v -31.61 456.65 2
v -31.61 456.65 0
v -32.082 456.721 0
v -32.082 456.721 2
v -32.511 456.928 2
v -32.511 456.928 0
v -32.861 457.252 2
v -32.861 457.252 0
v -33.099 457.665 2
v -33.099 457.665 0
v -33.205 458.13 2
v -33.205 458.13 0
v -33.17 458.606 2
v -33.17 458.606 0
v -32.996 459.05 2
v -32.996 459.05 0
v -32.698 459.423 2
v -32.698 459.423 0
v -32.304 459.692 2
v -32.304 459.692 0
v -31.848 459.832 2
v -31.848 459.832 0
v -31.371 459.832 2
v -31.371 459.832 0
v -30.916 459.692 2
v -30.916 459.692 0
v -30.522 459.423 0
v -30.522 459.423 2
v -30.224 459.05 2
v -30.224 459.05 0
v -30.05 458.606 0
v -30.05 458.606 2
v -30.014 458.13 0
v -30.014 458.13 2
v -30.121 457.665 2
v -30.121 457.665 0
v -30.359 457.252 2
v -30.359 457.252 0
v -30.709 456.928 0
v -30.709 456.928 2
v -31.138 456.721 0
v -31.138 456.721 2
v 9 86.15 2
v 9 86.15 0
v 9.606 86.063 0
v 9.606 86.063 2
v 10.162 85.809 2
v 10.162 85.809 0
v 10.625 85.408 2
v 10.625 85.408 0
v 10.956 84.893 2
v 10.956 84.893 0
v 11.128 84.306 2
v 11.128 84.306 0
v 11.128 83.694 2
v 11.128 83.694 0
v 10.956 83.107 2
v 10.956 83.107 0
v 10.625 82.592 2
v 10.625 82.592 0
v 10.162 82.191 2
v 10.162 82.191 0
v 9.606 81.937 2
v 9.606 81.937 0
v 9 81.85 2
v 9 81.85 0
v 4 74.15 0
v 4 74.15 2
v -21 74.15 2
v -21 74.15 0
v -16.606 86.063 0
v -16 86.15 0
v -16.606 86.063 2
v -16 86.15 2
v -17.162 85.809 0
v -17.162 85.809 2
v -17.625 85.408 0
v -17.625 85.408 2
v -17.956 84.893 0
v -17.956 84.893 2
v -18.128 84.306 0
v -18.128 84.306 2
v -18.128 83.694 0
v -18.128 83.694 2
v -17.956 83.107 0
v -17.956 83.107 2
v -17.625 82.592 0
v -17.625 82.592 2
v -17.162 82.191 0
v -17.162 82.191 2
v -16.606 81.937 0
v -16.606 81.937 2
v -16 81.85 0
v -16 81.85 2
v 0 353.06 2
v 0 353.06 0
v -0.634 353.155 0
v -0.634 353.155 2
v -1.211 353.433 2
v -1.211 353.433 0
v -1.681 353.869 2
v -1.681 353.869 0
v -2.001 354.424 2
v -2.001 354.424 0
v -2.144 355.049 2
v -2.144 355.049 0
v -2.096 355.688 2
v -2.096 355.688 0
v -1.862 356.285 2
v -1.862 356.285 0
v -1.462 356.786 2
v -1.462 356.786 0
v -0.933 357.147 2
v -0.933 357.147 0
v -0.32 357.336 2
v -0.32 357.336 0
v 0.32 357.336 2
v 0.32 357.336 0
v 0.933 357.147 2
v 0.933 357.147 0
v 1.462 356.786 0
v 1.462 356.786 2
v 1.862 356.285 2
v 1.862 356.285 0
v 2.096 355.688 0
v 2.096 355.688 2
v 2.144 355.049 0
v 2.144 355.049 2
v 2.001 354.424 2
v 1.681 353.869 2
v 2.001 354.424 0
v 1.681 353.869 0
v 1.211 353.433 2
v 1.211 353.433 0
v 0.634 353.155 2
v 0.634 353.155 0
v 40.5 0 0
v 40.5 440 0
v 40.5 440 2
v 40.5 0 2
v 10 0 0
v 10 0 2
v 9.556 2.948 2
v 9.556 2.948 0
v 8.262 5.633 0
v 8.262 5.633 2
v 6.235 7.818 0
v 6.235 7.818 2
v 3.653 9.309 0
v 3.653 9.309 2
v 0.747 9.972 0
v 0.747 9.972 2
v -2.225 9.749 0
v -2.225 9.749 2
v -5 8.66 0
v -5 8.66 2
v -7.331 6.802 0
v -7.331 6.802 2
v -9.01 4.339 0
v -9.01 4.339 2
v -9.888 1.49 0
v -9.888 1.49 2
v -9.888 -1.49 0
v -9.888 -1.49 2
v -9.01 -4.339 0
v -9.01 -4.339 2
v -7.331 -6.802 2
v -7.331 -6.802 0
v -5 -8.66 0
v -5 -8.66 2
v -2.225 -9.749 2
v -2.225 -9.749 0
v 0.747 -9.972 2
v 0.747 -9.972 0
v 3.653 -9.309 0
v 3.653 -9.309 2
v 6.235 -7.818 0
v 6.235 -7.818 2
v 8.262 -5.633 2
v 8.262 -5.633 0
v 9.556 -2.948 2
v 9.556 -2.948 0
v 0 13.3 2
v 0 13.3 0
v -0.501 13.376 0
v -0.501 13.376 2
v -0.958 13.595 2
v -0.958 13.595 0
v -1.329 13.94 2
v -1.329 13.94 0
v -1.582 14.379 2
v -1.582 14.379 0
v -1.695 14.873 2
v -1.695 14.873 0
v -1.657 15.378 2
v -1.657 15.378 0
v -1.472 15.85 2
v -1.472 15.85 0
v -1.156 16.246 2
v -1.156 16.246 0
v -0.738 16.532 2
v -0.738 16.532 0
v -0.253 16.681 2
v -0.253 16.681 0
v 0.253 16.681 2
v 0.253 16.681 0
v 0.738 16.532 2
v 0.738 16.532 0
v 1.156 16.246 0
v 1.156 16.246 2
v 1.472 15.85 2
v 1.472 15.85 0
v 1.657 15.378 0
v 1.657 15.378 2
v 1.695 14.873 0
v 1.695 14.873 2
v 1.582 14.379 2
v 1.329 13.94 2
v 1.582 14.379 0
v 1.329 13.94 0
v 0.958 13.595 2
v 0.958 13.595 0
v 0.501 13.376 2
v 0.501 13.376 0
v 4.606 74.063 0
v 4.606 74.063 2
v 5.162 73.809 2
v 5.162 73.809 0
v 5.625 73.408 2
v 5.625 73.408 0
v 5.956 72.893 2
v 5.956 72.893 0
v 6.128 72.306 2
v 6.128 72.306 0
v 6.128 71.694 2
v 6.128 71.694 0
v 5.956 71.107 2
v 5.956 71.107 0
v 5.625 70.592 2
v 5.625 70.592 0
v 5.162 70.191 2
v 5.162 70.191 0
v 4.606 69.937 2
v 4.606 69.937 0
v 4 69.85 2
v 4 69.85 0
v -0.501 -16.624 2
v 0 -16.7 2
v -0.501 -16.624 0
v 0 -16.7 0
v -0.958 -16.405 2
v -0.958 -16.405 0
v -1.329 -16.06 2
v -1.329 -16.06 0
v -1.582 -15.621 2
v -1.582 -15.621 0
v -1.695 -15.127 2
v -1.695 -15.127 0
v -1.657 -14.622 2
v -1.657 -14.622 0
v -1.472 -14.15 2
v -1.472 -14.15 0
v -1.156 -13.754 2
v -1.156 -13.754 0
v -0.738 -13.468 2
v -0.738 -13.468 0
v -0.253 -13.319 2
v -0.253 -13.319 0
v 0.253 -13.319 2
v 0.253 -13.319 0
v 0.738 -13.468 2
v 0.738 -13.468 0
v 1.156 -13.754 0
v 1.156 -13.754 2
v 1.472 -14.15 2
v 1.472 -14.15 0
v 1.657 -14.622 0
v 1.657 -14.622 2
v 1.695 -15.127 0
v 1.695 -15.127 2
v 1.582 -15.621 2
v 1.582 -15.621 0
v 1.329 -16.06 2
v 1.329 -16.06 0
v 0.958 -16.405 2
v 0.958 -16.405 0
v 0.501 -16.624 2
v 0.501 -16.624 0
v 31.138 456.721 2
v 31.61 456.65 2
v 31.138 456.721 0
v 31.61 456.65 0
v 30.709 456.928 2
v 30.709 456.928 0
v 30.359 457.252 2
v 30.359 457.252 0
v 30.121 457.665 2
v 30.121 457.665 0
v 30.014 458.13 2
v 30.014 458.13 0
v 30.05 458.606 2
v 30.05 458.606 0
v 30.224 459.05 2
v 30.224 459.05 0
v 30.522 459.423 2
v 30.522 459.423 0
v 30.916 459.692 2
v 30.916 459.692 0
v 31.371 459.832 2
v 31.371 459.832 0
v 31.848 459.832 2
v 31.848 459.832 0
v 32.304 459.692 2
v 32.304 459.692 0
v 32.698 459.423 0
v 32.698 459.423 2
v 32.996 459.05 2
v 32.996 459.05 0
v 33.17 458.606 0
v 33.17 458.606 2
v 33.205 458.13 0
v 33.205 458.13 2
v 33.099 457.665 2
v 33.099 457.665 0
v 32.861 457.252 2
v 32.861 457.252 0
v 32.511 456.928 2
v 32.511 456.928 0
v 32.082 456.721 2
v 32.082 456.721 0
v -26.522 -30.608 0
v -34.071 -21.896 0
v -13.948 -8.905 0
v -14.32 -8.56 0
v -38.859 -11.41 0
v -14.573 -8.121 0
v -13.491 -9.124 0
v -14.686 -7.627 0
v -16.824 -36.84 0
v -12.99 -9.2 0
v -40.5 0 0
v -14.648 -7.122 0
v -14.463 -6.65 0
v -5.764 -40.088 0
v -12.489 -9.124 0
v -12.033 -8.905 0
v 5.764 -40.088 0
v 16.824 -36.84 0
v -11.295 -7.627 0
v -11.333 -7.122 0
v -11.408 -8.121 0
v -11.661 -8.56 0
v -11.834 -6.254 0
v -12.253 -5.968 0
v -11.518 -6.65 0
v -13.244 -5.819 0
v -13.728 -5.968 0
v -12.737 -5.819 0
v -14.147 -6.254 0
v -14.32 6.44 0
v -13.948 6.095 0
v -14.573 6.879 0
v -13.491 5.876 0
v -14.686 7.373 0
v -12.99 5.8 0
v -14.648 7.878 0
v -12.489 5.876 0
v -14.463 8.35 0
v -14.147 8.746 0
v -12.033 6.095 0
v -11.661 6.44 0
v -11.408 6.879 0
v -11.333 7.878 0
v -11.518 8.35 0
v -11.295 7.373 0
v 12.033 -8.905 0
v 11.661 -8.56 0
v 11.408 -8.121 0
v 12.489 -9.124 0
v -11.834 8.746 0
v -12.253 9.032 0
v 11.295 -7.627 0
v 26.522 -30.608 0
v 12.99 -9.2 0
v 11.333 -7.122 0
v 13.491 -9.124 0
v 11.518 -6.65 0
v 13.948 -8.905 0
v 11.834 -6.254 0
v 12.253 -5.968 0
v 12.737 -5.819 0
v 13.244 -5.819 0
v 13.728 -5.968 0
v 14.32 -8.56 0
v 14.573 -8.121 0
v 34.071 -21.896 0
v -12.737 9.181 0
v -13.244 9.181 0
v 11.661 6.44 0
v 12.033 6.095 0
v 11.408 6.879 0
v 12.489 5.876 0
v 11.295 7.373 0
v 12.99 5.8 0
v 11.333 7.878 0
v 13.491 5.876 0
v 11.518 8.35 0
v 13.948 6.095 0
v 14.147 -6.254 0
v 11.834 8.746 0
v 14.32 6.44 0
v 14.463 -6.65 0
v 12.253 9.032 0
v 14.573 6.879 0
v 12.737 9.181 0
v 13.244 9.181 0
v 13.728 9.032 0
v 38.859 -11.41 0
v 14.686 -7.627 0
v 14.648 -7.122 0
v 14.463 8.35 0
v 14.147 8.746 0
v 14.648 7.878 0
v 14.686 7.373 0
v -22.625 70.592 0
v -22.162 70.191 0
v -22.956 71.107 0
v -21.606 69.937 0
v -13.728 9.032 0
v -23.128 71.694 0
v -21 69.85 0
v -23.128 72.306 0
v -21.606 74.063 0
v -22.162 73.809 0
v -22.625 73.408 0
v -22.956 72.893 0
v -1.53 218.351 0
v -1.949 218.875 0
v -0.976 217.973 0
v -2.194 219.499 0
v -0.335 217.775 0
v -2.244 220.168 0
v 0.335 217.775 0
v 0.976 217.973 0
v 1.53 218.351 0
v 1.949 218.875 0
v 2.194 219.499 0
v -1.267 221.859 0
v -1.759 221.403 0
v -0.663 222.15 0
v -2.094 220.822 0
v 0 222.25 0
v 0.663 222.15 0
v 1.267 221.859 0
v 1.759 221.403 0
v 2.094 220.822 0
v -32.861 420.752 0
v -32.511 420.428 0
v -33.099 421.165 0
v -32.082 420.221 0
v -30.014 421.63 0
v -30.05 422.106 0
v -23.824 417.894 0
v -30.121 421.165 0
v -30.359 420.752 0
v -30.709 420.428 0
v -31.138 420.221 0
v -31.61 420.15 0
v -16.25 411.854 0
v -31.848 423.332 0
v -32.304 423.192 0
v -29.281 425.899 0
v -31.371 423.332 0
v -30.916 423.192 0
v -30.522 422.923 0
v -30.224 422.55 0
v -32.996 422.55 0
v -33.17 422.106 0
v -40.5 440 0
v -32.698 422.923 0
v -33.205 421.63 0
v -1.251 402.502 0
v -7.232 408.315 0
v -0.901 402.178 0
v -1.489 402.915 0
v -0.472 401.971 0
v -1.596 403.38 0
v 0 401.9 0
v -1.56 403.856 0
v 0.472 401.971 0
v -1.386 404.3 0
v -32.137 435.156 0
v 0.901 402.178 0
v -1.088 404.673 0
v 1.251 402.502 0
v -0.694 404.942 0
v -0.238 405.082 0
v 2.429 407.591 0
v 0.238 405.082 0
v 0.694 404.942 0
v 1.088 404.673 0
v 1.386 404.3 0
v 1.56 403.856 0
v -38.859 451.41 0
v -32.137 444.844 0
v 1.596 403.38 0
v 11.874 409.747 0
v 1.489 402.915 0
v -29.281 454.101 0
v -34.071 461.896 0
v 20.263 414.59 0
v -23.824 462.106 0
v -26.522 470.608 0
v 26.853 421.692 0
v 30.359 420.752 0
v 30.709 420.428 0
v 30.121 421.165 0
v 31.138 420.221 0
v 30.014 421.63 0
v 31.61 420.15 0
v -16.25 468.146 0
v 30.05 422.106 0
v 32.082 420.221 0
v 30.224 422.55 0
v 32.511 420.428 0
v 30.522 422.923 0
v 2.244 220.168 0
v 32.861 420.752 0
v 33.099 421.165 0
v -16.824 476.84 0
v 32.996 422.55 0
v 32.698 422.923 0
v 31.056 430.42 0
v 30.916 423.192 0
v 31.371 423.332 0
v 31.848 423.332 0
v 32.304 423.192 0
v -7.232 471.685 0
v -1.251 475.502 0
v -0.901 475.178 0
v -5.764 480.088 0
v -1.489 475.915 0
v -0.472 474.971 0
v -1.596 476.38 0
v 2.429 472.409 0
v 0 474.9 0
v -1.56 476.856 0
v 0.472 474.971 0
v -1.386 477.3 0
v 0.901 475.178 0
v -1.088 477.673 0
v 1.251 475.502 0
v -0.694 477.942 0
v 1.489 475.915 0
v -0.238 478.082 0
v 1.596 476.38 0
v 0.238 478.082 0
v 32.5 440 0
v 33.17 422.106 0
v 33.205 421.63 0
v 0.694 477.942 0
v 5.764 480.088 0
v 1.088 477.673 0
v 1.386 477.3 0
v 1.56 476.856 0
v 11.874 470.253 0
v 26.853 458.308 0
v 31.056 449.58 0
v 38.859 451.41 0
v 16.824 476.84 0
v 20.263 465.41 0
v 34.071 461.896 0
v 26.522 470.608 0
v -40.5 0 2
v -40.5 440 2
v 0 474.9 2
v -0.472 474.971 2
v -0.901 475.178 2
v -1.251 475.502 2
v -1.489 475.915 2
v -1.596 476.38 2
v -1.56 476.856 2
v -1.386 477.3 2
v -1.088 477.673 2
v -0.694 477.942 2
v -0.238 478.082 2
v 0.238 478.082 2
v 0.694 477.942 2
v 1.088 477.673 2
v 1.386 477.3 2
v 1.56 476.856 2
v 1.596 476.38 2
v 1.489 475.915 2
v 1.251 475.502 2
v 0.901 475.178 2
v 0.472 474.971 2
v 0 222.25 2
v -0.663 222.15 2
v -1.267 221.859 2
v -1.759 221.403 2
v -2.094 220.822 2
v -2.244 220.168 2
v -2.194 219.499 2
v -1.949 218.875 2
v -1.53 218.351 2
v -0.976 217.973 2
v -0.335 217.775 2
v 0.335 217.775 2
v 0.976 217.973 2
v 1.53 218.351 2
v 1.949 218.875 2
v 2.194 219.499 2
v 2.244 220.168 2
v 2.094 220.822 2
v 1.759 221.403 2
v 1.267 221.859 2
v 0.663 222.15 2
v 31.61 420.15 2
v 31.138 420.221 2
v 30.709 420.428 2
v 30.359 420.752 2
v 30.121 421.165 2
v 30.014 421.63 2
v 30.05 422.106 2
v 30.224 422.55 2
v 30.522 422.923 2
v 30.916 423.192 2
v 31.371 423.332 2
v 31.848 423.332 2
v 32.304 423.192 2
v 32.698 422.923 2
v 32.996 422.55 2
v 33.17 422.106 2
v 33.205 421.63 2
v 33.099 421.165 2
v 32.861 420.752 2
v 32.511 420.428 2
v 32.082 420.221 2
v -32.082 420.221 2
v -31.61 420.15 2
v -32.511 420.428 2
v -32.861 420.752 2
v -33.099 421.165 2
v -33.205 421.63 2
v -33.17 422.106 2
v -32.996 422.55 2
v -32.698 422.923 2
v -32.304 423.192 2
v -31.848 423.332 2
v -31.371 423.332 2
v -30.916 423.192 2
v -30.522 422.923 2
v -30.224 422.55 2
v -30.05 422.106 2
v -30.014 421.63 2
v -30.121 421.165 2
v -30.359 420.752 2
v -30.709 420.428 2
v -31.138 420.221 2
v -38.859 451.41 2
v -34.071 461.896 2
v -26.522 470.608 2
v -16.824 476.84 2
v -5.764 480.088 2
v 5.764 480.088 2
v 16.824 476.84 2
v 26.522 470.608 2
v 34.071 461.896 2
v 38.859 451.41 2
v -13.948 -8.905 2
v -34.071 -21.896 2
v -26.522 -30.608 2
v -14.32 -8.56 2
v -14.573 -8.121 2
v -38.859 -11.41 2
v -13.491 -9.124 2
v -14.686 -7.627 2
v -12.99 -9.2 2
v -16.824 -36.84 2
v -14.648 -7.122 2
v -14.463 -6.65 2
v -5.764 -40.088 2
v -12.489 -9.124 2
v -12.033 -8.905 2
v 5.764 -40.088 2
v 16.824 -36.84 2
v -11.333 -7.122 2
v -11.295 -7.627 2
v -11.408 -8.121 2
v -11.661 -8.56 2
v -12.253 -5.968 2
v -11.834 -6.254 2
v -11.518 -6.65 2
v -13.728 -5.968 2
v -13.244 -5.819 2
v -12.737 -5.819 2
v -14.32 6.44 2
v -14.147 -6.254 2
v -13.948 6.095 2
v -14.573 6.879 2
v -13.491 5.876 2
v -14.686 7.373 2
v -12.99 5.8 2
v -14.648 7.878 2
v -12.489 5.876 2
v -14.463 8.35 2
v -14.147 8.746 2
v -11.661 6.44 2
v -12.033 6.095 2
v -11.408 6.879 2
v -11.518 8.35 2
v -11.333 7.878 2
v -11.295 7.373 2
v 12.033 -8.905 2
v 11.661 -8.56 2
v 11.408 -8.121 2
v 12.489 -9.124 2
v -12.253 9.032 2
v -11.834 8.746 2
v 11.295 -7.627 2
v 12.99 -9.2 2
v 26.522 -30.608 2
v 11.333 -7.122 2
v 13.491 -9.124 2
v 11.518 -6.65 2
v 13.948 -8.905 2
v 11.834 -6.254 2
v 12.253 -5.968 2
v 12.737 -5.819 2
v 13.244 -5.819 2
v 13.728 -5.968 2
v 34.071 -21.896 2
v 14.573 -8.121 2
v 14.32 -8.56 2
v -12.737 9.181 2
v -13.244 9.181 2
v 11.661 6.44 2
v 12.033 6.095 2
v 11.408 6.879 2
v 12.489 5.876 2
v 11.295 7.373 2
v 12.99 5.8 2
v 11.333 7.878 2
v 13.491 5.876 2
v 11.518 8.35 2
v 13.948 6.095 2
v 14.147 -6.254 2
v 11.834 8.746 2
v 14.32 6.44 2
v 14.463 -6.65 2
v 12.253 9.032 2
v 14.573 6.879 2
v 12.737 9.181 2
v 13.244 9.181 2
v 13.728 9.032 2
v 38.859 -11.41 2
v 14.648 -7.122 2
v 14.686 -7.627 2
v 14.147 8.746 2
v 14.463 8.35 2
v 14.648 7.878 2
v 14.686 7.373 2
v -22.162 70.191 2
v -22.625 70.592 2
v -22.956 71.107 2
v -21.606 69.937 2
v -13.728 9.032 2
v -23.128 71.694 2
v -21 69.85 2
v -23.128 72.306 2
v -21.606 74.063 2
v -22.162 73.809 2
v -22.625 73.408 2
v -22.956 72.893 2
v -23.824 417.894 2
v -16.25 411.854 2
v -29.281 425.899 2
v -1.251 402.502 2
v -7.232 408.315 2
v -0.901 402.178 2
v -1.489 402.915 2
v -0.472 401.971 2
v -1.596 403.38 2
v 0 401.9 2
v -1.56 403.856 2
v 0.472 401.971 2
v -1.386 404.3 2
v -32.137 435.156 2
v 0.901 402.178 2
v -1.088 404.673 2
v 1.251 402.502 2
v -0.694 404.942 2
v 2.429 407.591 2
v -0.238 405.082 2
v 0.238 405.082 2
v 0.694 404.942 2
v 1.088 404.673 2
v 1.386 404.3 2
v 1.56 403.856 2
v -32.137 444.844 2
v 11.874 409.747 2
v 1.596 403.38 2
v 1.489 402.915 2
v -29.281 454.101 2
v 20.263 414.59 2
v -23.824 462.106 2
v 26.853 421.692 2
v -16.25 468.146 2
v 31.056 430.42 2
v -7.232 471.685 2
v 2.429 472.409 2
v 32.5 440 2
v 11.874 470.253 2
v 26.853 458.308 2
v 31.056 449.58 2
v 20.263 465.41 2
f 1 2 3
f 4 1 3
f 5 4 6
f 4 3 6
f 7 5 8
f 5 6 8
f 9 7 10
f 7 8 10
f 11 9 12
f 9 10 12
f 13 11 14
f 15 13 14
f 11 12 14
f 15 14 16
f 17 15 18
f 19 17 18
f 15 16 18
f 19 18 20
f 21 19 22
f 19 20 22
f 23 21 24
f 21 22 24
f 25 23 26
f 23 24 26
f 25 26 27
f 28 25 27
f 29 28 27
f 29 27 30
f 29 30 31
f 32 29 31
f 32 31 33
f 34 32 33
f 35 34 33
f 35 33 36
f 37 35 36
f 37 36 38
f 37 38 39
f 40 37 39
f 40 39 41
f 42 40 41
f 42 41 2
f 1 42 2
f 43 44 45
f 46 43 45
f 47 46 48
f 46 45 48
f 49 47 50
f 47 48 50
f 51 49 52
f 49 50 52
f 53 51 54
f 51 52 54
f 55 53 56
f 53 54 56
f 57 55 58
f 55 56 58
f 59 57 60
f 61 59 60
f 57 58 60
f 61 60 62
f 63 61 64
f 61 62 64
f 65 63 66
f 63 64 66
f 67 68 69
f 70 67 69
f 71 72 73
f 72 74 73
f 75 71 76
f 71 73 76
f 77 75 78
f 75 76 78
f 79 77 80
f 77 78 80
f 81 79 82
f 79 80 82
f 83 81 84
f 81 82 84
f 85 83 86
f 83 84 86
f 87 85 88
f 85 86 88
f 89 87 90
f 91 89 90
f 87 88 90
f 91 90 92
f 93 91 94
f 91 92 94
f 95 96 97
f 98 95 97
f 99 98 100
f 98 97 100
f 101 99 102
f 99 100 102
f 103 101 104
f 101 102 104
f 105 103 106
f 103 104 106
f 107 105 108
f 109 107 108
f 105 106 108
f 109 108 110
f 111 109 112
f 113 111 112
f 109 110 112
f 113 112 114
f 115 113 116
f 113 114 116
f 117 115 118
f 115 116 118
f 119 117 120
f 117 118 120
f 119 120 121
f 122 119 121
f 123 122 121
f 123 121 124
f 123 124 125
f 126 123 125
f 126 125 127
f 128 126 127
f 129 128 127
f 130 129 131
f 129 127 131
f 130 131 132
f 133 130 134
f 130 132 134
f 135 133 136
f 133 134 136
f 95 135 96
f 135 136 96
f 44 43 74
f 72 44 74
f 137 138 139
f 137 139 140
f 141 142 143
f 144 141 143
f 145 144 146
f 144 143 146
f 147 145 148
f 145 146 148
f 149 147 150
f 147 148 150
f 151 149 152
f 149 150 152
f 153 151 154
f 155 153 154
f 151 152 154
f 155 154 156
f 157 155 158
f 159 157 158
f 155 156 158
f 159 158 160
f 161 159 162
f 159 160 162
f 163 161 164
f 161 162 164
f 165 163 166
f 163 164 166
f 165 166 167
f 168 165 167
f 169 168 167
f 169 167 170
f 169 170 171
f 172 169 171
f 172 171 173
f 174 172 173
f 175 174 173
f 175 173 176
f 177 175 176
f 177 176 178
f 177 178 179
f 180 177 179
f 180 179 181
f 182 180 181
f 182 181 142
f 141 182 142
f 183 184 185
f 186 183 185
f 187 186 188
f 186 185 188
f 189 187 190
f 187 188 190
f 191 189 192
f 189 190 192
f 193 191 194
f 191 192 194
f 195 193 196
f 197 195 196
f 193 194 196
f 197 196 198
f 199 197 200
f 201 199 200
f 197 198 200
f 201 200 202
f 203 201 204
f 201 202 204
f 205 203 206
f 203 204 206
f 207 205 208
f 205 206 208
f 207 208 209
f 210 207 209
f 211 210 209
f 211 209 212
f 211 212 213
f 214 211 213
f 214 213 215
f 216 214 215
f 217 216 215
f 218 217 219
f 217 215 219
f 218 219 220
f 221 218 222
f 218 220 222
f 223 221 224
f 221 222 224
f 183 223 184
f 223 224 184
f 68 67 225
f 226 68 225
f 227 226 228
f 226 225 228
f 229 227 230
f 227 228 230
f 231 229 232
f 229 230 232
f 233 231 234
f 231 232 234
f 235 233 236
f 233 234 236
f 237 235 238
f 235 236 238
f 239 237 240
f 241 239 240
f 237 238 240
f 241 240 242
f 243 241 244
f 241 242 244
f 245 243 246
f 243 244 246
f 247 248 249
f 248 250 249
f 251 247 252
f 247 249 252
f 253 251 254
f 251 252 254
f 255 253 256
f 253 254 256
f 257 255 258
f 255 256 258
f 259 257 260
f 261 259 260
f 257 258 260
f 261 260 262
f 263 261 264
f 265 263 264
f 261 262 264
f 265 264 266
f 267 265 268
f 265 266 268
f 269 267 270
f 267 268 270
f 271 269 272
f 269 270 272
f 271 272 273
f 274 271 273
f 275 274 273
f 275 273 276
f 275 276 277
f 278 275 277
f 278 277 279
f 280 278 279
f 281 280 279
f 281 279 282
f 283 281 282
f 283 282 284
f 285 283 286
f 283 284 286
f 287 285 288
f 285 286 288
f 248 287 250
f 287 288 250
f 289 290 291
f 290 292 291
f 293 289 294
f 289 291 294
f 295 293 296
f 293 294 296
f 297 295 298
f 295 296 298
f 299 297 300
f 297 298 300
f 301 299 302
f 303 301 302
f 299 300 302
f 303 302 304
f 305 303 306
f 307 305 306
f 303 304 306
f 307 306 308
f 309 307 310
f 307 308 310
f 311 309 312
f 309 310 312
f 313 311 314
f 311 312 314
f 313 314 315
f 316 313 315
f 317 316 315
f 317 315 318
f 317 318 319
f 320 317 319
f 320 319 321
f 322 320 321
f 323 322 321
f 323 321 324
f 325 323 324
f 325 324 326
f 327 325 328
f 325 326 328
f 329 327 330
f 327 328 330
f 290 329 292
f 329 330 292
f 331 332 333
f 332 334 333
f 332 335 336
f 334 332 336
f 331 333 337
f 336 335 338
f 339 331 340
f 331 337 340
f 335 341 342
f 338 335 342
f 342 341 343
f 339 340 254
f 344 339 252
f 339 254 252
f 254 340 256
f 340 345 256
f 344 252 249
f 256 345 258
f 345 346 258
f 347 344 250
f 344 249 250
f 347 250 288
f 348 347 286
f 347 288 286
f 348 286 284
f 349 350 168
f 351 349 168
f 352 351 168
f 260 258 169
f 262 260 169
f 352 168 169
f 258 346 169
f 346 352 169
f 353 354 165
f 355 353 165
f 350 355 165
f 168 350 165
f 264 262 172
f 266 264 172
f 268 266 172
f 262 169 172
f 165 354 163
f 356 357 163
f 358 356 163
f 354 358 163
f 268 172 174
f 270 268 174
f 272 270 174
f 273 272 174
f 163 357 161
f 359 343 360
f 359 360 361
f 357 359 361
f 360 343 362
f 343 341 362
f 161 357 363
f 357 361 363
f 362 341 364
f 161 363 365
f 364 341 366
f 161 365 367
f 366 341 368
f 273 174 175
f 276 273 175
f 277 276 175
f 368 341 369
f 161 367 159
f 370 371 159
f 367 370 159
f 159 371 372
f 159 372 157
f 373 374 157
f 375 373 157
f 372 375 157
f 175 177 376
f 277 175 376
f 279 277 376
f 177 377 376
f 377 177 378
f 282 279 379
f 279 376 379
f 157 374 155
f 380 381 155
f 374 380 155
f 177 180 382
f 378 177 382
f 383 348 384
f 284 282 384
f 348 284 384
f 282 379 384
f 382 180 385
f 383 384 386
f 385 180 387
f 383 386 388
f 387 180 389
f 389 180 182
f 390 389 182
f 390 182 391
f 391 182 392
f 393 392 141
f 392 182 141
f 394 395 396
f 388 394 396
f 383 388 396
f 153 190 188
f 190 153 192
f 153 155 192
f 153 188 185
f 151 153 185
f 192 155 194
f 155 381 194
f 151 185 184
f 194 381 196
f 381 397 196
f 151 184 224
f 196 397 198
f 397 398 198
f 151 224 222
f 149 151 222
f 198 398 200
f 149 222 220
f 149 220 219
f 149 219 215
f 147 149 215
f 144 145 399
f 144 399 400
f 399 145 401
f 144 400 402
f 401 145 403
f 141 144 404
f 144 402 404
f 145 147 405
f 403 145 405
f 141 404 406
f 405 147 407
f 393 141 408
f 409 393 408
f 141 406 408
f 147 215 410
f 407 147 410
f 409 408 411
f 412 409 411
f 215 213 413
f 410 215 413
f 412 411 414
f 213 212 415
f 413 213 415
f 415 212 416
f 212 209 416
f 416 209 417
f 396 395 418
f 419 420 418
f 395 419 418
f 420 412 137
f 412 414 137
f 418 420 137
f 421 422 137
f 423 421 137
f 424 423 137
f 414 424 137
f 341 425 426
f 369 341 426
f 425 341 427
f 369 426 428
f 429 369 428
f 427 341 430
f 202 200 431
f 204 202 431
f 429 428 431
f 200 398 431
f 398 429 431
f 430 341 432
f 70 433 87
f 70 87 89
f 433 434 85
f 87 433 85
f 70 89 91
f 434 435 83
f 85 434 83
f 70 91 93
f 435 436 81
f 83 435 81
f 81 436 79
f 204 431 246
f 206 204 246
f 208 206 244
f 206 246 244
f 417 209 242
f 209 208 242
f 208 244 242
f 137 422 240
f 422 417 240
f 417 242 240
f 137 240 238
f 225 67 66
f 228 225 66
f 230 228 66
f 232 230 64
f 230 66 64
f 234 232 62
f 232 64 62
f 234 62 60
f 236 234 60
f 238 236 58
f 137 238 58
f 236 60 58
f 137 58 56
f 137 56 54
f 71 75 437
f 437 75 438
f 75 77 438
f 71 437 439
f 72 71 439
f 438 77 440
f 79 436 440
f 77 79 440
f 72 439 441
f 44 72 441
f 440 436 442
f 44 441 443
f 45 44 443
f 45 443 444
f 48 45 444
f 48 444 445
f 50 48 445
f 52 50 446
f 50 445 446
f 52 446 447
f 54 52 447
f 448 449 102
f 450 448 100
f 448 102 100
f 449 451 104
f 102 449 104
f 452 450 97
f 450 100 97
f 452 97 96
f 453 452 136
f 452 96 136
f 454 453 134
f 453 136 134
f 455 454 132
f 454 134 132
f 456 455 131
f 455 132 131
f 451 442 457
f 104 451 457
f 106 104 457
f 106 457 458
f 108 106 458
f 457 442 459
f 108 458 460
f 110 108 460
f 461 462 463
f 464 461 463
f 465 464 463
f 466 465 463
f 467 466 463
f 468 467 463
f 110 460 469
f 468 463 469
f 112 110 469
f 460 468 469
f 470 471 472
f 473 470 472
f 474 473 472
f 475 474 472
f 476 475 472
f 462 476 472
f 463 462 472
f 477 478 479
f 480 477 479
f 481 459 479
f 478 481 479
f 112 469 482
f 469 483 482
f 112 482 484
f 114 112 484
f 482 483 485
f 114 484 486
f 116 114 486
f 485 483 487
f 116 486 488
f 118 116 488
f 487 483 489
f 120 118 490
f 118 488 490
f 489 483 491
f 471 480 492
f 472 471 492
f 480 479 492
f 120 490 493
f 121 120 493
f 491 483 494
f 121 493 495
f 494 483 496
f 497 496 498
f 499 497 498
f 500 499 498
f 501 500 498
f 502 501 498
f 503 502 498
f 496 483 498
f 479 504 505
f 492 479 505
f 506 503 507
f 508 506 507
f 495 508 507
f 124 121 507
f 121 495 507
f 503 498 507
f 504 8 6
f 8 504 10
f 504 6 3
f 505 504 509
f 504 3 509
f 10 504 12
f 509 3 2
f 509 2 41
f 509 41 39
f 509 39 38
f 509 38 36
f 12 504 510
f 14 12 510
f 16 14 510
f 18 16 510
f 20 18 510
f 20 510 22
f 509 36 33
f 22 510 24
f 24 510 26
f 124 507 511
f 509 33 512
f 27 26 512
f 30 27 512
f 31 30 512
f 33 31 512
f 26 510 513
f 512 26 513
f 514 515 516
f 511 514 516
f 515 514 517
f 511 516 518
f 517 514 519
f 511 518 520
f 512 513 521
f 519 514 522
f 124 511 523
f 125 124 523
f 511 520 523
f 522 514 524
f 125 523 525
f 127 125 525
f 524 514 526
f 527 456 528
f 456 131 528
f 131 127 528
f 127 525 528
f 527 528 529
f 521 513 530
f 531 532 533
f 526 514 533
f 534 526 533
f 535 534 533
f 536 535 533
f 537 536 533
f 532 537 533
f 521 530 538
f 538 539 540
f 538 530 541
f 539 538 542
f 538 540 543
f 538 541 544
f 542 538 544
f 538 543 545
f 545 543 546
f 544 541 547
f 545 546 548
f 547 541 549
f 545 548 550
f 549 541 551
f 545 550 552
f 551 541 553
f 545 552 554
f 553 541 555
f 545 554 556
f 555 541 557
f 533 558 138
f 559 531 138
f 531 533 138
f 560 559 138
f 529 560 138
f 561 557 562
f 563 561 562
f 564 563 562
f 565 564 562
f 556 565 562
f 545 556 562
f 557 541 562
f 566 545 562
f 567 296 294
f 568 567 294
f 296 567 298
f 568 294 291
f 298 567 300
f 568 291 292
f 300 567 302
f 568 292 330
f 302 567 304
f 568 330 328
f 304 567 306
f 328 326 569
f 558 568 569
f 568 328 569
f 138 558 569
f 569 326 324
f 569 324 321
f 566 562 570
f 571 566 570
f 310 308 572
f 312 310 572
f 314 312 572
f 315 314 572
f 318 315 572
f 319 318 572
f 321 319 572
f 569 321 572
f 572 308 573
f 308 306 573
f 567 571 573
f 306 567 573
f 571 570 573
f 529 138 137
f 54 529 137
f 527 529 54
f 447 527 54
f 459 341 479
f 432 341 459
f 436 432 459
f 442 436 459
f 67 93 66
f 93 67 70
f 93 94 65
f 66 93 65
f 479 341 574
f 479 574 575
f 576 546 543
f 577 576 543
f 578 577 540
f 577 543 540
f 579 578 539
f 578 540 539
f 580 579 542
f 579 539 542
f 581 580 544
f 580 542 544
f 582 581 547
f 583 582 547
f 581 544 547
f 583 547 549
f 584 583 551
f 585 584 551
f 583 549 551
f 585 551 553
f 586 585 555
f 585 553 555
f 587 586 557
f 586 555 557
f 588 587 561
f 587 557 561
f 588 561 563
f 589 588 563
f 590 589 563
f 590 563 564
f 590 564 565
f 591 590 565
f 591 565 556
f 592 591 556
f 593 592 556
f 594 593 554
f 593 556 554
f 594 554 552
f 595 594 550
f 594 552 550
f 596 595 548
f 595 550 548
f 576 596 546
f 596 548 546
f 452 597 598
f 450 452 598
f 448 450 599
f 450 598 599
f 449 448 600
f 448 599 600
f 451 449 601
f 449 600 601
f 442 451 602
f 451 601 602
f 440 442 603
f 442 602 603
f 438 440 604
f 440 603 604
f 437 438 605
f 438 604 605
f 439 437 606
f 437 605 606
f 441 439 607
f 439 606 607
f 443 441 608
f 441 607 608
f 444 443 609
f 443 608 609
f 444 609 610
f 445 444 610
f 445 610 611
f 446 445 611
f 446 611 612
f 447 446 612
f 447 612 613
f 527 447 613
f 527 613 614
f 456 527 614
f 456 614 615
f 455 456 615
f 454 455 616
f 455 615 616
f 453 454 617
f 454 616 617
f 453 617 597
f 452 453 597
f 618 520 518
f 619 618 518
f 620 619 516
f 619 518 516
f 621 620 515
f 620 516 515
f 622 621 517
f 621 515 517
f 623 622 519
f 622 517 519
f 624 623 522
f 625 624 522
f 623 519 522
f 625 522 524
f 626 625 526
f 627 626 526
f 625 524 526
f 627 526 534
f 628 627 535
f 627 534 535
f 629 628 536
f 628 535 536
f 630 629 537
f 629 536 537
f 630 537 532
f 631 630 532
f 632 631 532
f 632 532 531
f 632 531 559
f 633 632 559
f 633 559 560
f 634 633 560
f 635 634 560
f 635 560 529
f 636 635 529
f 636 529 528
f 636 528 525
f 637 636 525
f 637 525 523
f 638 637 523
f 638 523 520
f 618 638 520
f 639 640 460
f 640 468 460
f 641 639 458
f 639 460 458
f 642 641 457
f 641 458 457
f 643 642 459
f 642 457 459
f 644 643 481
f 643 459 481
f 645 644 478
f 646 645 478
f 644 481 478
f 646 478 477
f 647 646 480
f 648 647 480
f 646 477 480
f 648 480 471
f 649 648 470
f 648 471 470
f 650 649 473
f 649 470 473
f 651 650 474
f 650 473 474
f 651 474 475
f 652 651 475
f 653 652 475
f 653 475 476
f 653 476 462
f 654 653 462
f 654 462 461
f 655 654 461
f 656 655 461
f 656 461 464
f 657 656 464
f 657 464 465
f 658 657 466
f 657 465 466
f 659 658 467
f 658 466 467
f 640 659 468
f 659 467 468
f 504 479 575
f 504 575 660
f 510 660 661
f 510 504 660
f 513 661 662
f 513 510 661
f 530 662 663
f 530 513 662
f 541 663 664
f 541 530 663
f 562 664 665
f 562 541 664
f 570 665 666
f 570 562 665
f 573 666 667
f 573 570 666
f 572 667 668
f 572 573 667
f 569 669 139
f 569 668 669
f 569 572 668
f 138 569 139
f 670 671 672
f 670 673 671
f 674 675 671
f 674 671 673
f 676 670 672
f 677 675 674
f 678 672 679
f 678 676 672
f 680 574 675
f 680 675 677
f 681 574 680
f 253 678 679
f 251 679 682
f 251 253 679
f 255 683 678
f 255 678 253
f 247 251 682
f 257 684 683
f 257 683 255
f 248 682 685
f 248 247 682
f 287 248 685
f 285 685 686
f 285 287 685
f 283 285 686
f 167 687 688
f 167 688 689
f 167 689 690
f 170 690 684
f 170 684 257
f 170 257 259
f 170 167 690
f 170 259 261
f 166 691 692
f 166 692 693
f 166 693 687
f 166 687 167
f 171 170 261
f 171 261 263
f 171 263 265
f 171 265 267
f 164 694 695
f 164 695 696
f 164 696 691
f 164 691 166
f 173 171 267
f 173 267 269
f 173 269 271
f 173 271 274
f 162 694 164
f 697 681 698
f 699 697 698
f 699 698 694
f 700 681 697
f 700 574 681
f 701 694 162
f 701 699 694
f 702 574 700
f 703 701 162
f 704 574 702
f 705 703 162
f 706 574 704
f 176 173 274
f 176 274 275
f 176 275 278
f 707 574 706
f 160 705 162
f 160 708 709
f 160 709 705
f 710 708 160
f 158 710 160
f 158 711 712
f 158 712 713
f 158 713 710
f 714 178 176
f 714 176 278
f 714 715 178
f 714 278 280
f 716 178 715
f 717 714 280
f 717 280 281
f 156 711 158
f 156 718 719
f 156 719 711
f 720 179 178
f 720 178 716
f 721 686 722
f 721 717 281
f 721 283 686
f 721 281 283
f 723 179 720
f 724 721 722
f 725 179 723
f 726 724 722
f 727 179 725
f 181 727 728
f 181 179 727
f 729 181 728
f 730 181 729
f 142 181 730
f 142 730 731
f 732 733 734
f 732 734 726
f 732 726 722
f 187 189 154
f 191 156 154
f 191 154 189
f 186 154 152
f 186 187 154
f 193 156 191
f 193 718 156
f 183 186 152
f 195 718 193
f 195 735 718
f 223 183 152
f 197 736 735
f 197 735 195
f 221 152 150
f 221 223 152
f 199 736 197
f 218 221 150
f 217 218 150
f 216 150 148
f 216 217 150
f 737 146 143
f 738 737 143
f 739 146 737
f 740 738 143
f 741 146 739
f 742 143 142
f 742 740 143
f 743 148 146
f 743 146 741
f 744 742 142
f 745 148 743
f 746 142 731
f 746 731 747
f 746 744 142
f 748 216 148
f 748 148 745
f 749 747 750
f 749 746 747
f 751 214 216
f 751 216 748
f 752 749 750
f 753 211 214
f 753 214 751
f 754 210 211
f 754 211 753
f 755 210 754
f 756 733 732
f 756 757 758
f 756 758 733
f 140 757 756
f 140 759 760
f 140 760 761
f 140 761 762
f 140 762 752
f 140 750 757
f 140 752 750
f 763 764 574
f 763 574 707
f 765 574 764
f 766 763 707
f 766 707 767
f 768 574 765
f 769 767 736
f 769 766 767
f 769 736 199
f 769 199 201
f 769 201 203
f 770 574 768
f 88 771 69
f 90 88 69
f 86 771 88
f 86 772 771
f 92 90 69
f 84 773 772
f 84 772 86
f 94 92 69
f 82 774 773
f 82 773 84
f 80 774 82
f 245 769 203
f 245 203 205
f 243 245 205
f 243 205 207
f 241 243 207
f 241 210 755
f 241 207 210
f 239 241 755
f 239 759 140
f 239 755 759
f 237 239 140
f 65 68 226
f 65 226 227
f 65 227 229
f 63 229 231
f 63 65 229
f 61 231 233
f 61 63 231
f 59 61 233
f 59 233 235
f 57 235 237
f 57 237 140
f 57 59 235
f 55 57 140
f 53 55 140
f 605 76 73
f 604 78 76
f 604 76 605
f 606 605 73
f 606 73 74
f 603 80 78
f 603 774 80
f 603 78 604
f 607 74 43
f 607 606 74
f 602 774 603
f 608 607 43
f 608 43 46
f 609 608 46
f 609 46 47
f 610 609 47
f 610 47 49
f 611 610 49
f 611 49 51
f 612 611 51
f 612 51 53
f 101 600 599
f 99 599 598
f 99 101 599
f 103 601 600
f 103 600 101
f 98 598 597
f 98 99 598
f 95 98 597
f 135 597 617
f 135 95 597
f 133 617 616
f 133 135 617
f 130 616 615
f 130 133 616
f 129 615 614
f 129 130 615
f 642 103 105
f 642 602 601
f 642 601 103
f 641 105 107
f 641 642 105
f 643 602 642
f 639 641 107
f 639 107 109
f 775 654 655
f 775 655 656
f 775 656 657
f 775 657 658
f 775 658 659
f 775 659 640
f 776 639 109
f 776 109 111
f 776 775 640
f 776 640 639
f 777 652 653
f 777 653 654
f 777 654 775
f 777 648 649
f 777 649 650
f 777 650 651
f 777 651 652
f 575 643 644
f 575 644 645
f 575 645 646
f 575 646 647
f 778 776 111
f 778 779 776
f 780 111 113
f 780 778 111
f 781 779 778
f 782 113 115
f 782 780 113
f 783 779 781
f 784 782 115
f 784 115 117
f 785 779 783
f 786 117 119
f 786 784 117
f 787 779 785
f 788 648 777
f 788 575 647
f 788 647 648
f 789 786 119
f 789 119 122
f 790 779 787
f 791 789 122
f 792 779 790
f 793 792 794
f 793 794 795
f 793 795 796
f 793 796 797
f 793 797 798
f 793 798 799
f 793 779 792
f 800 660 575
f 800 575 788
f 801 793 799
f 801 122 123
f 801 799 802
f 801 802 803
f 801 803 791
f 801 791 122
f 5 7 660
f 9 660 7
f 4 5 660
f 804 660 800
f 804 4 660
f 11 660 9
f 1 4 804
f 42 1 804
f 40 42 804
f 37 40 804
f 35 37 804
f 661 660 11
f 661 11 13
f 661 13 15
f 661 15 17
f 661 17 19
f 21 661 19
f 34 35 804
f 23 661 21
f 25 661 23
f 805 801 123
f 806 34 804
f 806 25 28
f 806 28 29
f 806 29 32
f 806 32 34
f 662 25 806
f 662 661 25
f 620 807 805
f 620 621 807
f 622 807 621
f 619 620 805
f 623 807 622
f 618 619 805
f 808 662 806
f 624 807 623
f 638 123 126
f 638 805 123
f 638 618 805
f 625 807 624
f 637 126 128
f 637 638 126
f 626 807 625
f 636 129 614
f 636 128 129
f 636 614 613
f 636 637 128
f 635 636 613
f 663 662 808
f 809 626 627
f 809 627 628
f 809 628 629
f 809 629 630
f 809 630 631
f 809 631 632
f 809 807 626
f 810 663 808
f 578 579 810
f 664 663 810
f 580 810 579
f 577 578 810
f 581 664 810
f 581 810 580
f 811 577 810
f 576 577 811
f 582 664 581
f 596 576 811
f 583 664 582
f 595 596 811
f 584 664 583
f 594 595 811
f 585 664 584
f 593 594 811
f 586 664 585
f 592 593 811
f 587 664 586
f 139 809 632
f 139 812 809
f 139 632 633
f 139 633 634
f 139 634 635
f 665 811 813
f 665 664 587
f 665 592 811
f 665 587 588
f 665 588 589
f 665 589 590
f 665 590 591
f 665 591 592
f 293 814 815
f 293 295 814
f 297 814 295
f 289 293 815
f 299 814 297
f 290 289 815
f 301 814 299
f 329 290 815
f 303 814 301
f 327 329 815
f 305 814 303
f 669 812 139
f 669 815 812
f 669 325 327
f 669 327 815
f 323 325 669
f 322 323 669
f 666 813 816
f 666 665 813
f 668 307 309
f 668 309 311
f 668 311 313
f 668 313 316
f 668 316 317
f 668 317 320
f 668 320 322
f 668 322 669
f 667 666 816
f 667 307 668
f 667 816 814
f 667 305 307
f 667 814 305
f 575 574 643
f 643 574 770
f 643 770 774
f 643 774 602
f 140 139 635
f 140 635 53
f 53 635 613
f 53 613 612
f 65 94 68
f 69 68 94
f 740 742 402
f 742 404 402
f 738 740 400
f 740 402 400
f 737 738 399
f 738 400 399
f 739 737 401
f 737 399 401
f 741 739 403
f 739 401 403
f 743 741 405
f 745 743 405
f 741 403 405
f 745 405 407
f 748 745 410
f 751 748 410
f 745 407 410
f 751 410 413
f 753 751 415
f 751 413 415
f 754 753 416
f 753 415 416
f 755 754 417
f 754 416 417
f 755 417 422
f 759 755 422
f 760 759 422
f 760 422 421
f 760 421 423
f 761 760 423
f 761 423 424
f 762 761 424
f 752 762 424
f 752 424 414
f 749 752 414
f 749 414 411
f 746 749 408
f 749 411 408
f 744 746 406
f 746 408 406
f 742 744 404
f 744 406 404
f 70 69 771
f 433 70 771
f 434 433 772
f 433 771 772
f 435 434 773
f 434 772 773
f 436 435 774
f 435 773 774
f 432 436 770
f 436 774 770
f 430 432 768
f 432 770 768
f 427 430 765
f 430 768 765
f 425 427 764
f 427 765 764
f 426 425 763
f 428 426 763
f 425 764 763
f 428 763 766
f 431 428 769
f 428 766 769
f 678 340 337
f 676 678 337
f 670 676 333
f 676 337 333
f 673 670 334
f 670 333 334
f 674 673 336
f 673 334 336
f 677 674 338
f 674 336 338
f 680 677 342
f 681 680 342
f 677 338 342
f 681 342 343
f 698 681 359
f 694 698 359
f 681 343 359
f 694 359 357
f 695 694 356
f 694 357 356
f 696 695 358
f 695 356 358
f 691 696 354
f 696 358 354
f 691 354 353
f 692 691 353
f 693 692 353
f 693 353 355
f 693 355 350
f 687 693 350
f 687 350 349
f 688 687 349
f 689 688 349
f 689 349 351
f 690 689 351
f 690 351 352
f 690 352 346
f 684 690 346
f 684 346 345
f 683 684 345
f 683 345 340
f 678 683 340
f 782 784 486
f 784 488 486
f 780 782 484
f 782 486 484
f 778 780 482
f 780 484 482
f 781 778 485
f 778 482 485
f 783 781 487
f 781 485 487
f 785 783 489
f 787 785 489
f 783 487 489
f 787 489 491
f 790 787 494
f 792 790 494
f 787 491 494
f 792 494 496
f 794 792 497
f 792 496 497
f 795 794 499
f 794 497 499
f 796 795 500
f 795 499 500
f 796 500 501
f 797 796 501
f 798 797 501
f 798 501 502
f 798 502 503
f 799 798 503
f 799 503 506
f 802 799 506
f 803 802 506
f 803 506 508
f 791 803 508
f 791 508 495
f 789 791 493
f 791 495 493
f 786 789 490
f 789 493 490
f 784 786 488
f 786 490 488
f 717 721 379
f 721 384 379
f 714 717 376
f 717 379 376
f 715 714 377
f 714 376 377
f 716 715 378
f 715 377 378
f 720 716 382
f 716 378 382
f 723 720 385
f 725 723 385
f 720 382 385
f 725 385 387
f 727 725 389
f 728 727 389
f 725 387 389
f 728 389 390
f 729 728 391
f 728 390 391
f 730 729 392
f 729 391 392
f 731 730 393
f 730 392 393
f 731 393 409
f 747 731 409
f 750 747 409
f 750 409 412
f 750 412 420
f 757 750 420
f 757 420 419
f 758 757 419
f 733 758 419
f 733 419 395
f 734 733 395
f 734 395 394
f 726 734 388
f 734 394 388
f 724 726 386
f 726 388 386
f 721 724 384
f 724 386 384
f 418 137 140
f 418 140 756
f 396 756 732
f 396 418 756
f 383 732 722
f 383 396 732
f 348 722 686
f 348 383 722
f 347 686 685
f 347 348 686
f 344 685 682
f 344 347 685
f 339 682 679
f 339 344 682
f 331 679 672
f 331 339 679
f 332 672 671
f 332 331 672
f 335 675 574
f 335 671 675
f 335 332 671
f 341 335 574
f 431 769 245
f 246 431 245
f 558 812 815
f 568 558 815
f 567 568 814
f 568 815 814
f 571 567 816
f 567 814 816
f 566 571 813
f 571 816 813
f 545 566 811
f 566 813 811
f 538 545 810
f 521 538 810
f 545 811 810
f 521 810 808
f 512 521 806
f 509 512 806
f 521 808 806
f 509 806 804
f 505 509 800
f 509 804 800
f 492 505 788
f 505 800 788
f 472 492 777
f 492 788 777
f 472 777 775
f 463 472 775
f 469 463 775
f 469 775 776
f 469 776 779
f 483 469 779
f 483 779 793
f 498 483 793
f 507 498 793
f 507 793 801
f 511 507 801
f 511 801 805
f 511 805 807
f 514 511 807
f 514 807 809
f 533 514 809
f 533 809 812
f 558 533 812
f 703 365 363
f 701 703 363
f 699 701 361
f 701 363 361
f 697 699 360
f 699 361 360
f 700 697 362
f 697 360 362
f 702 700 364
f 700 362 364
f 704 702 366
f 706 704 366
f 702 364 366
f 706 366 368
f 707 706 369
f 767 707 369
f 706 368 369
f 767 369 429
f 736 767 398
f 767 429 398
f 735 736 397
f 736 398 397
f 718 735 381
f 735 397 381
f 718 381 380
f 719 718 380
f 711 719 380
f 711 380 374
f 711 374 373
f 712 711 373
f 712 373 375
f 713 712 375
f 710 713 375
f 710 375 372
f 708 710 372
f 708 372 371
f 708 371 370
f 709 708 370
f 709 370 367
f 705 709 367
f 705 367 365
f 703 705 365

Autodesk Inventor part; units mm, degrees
ref_plane "YZ Plane" through (0, 0, 0) normal (1, 0, 0) x (0, 1, 0)
ref_plane "XZ Plane" through (0, 0, 0) normal (0, 1, 0) x (-1, 0, 0)
ref_plane "XY Plane" through (0, 0, 0) normal (0, 0, 1) x (1, 0, 0)
sketch "スケッチ1" plane through (0, 0, 0) normal (0, 0, 1) x (1, 0, 0)
  circle A0 centre (0, 0) radius 40.5
  circle A1 centre (0, 440) radius 40.5
  line L0 (-40.5, 0) -> (-40.5, 440)
  line L1 (40.5, 440) -> (40.5, 0)
  dimension "d0" = 81
  dimension "d1" = 81
  dimension "d2" = 440
extrude "プレート1" add sketch "スケッチ1" along normal blind 2
sketch "スケッチ6" plane through (0, 0, 2) normal (0, 0, 1) x (1, 0, 0)
  arc A0 (40.5, 440) -> (-40.5, 440) centre (0, 440) ccw projected
  circle A1 centre (0, 440) radius 32.5
  point P0 (0, 0)
  dimension "d43" = 65
extrude "押し出し2" cut sketch "スケッチ6" against normal blind 10
sketch "スケッチ7" plane through (0, 0, 2) normal (0, 0, 1) x (1, 0, 0)
  arc A0 (40.5, 440) -> (-40.5, 440) centre (0, 440) ccw projected
  circle A1 centre (0, 440) radius 36.5
  point P0 (0, 0)
  point P1 (0, 476.5)
  point P2 (-31.6099, 458.25)
  point P3 (-31.6099, 421.75)
  point P4 (0, 403.5)
  point P5 (31.6099, 421.75)
  point P6 (31.6099, 458.25)
  dimension "d46" = 73
  dimension "d49" = 360
hole "穴4" at (0, 476.5, 2) at (-31.6099, 458.25, 2) at (-31.6099, 421.75, 2) at (0, 403.5, 2) at (31.6099, 421.75, 2) at (31.6099, 458.25, 2) direction (0, 0, -1) diameter 3.2 end through all clearance for "Socket Head Cap Screw" size "M3" standard "Ansi Metric M Profile"
sketch "スケッチ8" plane through (0, 0, 2) normal (0, 0, 1) x (1, 0, 0)
  arc A0 (40.5, 440) -> (-40.5, 440) centre (0, 440) ccw projected
  circle A1 centre (0, 440) radius 25
  line L0 (23.4923, 431.4495) -> (-32.7335, 276.9703)
  line L1 (-23.4923, 448.5505) -> (-36.9957, 411.4503)
  line L2 (0, 603.9) -> (0, -147.9) projected
  circle A2 centre (0, 355.2097) radius 4
  point P0 (0, 0)
  point P1 (4, 72)
  dimension "d92" = 50
  dimension "d93" = 20
  dimension "d94" = 8
  dimension "d102" = 0
  dimension "d140" = 72
  dimension "d141" = 4
hole "穴5" at (4, 72, 2) at (0, 355.2097, 2) direction (0, 0, -1) diameter 4.3 end through all clearance for "Socket Head Cap Screw" size "M4" standard "Ansi Metric M Profile"
sketch "スケッチ9" plane through (0, 0, 2) normal (0, 0, 1) x (1, 0, 0)
  circle A0 centre (0, 0) radius 67.5
  circle A1 centre (9, 84) radius 8
  arc A2 (40.5, 440) -> (-40.5, 440) centre (0, 440) ccw projected
  dimension "d69" = 84
  dimension "d79" = 135
  dimension "d80" = 16
  dimension "d144" = 9
hole "穴6" at (9, 84, 2) direction (0, 0, -1) diameter 4.3 end through all clearance for "Flat Head Machine Screw" size "M4" standard "Ansi Metric M Profile"
sketch "スケッチ13" plane through (0, 0, 2) normal (0, 0, 1) x (1, 0, 0)
  circle A0 centre (0, 0) radius 15
  point P0 (0, 15)
  point P1 (-12.9904, 7.5)
  point P2 (-12.9904, -7.5)
  point P3 (0, -15)
  point P4 (12.9904, -7.5)
  point P5 (12.9904, 7.5)
  dimension "d109" = 30
  dimension "d112" = 360
hole "穴8" at (0, 15, 2) at (-12.9904, 7.5, 2) at (-12.9904, -7.5, 2) at (0, -15, 2) at (12.9904, -7.5, 2) at (12.9904, 7.5, 2) direction (0, 0, -1) diameter 3.4 end through all clearance for "Flat Head Machine Screw" size "M3" standard "Ansi Metric M Profile"
sketch "スケッチ14" plane through (0, 0, 2) normal (0, 0, 1) x (1, 0, 0)
  circle A0 centre (0, 0) radius 10
  dimension "d121" = 20
extrude "押し出し5" cut sketch "スケッチ14" against normal blind 10
sketch "スケッチ15" plane through (0, 0, 2) normal (0, 0, 1) x (1, 0, 0)
  line L0 (-16, 84) -> (9, 84) construction
  line L1 (-16, 81.85) -> (9, 81.85)
  line L2 (9, 86.15) -> (-16, 86.15)
  arc A0 (-16, 86.15) -> (-16, 81.85) centre (-16, 84) ccw
  arc A1 (9, 81.85) -> (9, 86.15) centre (9, 84) ccw
  circle A2 centre (9, 84) radius 2.15 projected
  point P0 (0, 0)
  dimension "d142" = 25
extrude "押し出し6" cut sketch "スケッチ15" against normal blind 10
sketch "スケッチ17" plane through (0, 0, 0) normal (0, 0, -1) x (-1, 0, 0)
  point P0 (0, 0)
  point P1 (0, 220)
  dimension "d132" = 220
hole "穴9" at (0, 220, 0) direction (0, 0, 1) diameter 4.5 end through all clearance for "Flat Head Machine Screw" size "M4" standard "Ansi Metric M Profile"
sketch "スケッチ16" plane through (0, 0, 2) normal (0, 0, 1) x (1, 0, 0)
  line L0 (-21, 72) -> (4, 72) construction
  line L1 (-21, 69.85) -> (4, 69.85)
  line L2 (4, 74.15) -> (-21, 74.15)
  arc A0 (-21, 74.15) -> (-21, 69.85) centre (-21, 72) ccw
  arc A1 (4, 69.85) -> (4, 74.15) centre (4, 72) ccw
  circle A2 centre (4, 72) radius 2.15 projected
  point P0 (0, 0)
  point P1 (-8.5, 72)
  dimension "d143" = 21
extrude "押し出し7" cut sketch "スケッチ16" against normal blind 10
equation "\"d56\" = Thickness"
equation "\"d67\" = Thickness"
equation "\"d77\" = Thickness"
equation "\"d119\" = Thickness"
equation "\"d138\" = Thickness"
equation "\"d3\" = Thickness"
equation "\"BendRadius\" = Thickness"
equation "\"BendReliefWidth\" = Thickness"
equation "\"BendReliefDepth\" = 0.5 * Thickness"
equation "\"CornerReliefSize\" = 4 * Thickness"
equation "\"MinimumRemnant\" = 2 * Thickness"
equation "\"TransitionRadius\" = BendRadius"
equation "\"JacobiRadiusSize\" = Thickness"
equation "\"GapSize\" = Thickness"
equation "\"Thickness\" = 2"
properties part number "link2-plate1" material "CFRP"
